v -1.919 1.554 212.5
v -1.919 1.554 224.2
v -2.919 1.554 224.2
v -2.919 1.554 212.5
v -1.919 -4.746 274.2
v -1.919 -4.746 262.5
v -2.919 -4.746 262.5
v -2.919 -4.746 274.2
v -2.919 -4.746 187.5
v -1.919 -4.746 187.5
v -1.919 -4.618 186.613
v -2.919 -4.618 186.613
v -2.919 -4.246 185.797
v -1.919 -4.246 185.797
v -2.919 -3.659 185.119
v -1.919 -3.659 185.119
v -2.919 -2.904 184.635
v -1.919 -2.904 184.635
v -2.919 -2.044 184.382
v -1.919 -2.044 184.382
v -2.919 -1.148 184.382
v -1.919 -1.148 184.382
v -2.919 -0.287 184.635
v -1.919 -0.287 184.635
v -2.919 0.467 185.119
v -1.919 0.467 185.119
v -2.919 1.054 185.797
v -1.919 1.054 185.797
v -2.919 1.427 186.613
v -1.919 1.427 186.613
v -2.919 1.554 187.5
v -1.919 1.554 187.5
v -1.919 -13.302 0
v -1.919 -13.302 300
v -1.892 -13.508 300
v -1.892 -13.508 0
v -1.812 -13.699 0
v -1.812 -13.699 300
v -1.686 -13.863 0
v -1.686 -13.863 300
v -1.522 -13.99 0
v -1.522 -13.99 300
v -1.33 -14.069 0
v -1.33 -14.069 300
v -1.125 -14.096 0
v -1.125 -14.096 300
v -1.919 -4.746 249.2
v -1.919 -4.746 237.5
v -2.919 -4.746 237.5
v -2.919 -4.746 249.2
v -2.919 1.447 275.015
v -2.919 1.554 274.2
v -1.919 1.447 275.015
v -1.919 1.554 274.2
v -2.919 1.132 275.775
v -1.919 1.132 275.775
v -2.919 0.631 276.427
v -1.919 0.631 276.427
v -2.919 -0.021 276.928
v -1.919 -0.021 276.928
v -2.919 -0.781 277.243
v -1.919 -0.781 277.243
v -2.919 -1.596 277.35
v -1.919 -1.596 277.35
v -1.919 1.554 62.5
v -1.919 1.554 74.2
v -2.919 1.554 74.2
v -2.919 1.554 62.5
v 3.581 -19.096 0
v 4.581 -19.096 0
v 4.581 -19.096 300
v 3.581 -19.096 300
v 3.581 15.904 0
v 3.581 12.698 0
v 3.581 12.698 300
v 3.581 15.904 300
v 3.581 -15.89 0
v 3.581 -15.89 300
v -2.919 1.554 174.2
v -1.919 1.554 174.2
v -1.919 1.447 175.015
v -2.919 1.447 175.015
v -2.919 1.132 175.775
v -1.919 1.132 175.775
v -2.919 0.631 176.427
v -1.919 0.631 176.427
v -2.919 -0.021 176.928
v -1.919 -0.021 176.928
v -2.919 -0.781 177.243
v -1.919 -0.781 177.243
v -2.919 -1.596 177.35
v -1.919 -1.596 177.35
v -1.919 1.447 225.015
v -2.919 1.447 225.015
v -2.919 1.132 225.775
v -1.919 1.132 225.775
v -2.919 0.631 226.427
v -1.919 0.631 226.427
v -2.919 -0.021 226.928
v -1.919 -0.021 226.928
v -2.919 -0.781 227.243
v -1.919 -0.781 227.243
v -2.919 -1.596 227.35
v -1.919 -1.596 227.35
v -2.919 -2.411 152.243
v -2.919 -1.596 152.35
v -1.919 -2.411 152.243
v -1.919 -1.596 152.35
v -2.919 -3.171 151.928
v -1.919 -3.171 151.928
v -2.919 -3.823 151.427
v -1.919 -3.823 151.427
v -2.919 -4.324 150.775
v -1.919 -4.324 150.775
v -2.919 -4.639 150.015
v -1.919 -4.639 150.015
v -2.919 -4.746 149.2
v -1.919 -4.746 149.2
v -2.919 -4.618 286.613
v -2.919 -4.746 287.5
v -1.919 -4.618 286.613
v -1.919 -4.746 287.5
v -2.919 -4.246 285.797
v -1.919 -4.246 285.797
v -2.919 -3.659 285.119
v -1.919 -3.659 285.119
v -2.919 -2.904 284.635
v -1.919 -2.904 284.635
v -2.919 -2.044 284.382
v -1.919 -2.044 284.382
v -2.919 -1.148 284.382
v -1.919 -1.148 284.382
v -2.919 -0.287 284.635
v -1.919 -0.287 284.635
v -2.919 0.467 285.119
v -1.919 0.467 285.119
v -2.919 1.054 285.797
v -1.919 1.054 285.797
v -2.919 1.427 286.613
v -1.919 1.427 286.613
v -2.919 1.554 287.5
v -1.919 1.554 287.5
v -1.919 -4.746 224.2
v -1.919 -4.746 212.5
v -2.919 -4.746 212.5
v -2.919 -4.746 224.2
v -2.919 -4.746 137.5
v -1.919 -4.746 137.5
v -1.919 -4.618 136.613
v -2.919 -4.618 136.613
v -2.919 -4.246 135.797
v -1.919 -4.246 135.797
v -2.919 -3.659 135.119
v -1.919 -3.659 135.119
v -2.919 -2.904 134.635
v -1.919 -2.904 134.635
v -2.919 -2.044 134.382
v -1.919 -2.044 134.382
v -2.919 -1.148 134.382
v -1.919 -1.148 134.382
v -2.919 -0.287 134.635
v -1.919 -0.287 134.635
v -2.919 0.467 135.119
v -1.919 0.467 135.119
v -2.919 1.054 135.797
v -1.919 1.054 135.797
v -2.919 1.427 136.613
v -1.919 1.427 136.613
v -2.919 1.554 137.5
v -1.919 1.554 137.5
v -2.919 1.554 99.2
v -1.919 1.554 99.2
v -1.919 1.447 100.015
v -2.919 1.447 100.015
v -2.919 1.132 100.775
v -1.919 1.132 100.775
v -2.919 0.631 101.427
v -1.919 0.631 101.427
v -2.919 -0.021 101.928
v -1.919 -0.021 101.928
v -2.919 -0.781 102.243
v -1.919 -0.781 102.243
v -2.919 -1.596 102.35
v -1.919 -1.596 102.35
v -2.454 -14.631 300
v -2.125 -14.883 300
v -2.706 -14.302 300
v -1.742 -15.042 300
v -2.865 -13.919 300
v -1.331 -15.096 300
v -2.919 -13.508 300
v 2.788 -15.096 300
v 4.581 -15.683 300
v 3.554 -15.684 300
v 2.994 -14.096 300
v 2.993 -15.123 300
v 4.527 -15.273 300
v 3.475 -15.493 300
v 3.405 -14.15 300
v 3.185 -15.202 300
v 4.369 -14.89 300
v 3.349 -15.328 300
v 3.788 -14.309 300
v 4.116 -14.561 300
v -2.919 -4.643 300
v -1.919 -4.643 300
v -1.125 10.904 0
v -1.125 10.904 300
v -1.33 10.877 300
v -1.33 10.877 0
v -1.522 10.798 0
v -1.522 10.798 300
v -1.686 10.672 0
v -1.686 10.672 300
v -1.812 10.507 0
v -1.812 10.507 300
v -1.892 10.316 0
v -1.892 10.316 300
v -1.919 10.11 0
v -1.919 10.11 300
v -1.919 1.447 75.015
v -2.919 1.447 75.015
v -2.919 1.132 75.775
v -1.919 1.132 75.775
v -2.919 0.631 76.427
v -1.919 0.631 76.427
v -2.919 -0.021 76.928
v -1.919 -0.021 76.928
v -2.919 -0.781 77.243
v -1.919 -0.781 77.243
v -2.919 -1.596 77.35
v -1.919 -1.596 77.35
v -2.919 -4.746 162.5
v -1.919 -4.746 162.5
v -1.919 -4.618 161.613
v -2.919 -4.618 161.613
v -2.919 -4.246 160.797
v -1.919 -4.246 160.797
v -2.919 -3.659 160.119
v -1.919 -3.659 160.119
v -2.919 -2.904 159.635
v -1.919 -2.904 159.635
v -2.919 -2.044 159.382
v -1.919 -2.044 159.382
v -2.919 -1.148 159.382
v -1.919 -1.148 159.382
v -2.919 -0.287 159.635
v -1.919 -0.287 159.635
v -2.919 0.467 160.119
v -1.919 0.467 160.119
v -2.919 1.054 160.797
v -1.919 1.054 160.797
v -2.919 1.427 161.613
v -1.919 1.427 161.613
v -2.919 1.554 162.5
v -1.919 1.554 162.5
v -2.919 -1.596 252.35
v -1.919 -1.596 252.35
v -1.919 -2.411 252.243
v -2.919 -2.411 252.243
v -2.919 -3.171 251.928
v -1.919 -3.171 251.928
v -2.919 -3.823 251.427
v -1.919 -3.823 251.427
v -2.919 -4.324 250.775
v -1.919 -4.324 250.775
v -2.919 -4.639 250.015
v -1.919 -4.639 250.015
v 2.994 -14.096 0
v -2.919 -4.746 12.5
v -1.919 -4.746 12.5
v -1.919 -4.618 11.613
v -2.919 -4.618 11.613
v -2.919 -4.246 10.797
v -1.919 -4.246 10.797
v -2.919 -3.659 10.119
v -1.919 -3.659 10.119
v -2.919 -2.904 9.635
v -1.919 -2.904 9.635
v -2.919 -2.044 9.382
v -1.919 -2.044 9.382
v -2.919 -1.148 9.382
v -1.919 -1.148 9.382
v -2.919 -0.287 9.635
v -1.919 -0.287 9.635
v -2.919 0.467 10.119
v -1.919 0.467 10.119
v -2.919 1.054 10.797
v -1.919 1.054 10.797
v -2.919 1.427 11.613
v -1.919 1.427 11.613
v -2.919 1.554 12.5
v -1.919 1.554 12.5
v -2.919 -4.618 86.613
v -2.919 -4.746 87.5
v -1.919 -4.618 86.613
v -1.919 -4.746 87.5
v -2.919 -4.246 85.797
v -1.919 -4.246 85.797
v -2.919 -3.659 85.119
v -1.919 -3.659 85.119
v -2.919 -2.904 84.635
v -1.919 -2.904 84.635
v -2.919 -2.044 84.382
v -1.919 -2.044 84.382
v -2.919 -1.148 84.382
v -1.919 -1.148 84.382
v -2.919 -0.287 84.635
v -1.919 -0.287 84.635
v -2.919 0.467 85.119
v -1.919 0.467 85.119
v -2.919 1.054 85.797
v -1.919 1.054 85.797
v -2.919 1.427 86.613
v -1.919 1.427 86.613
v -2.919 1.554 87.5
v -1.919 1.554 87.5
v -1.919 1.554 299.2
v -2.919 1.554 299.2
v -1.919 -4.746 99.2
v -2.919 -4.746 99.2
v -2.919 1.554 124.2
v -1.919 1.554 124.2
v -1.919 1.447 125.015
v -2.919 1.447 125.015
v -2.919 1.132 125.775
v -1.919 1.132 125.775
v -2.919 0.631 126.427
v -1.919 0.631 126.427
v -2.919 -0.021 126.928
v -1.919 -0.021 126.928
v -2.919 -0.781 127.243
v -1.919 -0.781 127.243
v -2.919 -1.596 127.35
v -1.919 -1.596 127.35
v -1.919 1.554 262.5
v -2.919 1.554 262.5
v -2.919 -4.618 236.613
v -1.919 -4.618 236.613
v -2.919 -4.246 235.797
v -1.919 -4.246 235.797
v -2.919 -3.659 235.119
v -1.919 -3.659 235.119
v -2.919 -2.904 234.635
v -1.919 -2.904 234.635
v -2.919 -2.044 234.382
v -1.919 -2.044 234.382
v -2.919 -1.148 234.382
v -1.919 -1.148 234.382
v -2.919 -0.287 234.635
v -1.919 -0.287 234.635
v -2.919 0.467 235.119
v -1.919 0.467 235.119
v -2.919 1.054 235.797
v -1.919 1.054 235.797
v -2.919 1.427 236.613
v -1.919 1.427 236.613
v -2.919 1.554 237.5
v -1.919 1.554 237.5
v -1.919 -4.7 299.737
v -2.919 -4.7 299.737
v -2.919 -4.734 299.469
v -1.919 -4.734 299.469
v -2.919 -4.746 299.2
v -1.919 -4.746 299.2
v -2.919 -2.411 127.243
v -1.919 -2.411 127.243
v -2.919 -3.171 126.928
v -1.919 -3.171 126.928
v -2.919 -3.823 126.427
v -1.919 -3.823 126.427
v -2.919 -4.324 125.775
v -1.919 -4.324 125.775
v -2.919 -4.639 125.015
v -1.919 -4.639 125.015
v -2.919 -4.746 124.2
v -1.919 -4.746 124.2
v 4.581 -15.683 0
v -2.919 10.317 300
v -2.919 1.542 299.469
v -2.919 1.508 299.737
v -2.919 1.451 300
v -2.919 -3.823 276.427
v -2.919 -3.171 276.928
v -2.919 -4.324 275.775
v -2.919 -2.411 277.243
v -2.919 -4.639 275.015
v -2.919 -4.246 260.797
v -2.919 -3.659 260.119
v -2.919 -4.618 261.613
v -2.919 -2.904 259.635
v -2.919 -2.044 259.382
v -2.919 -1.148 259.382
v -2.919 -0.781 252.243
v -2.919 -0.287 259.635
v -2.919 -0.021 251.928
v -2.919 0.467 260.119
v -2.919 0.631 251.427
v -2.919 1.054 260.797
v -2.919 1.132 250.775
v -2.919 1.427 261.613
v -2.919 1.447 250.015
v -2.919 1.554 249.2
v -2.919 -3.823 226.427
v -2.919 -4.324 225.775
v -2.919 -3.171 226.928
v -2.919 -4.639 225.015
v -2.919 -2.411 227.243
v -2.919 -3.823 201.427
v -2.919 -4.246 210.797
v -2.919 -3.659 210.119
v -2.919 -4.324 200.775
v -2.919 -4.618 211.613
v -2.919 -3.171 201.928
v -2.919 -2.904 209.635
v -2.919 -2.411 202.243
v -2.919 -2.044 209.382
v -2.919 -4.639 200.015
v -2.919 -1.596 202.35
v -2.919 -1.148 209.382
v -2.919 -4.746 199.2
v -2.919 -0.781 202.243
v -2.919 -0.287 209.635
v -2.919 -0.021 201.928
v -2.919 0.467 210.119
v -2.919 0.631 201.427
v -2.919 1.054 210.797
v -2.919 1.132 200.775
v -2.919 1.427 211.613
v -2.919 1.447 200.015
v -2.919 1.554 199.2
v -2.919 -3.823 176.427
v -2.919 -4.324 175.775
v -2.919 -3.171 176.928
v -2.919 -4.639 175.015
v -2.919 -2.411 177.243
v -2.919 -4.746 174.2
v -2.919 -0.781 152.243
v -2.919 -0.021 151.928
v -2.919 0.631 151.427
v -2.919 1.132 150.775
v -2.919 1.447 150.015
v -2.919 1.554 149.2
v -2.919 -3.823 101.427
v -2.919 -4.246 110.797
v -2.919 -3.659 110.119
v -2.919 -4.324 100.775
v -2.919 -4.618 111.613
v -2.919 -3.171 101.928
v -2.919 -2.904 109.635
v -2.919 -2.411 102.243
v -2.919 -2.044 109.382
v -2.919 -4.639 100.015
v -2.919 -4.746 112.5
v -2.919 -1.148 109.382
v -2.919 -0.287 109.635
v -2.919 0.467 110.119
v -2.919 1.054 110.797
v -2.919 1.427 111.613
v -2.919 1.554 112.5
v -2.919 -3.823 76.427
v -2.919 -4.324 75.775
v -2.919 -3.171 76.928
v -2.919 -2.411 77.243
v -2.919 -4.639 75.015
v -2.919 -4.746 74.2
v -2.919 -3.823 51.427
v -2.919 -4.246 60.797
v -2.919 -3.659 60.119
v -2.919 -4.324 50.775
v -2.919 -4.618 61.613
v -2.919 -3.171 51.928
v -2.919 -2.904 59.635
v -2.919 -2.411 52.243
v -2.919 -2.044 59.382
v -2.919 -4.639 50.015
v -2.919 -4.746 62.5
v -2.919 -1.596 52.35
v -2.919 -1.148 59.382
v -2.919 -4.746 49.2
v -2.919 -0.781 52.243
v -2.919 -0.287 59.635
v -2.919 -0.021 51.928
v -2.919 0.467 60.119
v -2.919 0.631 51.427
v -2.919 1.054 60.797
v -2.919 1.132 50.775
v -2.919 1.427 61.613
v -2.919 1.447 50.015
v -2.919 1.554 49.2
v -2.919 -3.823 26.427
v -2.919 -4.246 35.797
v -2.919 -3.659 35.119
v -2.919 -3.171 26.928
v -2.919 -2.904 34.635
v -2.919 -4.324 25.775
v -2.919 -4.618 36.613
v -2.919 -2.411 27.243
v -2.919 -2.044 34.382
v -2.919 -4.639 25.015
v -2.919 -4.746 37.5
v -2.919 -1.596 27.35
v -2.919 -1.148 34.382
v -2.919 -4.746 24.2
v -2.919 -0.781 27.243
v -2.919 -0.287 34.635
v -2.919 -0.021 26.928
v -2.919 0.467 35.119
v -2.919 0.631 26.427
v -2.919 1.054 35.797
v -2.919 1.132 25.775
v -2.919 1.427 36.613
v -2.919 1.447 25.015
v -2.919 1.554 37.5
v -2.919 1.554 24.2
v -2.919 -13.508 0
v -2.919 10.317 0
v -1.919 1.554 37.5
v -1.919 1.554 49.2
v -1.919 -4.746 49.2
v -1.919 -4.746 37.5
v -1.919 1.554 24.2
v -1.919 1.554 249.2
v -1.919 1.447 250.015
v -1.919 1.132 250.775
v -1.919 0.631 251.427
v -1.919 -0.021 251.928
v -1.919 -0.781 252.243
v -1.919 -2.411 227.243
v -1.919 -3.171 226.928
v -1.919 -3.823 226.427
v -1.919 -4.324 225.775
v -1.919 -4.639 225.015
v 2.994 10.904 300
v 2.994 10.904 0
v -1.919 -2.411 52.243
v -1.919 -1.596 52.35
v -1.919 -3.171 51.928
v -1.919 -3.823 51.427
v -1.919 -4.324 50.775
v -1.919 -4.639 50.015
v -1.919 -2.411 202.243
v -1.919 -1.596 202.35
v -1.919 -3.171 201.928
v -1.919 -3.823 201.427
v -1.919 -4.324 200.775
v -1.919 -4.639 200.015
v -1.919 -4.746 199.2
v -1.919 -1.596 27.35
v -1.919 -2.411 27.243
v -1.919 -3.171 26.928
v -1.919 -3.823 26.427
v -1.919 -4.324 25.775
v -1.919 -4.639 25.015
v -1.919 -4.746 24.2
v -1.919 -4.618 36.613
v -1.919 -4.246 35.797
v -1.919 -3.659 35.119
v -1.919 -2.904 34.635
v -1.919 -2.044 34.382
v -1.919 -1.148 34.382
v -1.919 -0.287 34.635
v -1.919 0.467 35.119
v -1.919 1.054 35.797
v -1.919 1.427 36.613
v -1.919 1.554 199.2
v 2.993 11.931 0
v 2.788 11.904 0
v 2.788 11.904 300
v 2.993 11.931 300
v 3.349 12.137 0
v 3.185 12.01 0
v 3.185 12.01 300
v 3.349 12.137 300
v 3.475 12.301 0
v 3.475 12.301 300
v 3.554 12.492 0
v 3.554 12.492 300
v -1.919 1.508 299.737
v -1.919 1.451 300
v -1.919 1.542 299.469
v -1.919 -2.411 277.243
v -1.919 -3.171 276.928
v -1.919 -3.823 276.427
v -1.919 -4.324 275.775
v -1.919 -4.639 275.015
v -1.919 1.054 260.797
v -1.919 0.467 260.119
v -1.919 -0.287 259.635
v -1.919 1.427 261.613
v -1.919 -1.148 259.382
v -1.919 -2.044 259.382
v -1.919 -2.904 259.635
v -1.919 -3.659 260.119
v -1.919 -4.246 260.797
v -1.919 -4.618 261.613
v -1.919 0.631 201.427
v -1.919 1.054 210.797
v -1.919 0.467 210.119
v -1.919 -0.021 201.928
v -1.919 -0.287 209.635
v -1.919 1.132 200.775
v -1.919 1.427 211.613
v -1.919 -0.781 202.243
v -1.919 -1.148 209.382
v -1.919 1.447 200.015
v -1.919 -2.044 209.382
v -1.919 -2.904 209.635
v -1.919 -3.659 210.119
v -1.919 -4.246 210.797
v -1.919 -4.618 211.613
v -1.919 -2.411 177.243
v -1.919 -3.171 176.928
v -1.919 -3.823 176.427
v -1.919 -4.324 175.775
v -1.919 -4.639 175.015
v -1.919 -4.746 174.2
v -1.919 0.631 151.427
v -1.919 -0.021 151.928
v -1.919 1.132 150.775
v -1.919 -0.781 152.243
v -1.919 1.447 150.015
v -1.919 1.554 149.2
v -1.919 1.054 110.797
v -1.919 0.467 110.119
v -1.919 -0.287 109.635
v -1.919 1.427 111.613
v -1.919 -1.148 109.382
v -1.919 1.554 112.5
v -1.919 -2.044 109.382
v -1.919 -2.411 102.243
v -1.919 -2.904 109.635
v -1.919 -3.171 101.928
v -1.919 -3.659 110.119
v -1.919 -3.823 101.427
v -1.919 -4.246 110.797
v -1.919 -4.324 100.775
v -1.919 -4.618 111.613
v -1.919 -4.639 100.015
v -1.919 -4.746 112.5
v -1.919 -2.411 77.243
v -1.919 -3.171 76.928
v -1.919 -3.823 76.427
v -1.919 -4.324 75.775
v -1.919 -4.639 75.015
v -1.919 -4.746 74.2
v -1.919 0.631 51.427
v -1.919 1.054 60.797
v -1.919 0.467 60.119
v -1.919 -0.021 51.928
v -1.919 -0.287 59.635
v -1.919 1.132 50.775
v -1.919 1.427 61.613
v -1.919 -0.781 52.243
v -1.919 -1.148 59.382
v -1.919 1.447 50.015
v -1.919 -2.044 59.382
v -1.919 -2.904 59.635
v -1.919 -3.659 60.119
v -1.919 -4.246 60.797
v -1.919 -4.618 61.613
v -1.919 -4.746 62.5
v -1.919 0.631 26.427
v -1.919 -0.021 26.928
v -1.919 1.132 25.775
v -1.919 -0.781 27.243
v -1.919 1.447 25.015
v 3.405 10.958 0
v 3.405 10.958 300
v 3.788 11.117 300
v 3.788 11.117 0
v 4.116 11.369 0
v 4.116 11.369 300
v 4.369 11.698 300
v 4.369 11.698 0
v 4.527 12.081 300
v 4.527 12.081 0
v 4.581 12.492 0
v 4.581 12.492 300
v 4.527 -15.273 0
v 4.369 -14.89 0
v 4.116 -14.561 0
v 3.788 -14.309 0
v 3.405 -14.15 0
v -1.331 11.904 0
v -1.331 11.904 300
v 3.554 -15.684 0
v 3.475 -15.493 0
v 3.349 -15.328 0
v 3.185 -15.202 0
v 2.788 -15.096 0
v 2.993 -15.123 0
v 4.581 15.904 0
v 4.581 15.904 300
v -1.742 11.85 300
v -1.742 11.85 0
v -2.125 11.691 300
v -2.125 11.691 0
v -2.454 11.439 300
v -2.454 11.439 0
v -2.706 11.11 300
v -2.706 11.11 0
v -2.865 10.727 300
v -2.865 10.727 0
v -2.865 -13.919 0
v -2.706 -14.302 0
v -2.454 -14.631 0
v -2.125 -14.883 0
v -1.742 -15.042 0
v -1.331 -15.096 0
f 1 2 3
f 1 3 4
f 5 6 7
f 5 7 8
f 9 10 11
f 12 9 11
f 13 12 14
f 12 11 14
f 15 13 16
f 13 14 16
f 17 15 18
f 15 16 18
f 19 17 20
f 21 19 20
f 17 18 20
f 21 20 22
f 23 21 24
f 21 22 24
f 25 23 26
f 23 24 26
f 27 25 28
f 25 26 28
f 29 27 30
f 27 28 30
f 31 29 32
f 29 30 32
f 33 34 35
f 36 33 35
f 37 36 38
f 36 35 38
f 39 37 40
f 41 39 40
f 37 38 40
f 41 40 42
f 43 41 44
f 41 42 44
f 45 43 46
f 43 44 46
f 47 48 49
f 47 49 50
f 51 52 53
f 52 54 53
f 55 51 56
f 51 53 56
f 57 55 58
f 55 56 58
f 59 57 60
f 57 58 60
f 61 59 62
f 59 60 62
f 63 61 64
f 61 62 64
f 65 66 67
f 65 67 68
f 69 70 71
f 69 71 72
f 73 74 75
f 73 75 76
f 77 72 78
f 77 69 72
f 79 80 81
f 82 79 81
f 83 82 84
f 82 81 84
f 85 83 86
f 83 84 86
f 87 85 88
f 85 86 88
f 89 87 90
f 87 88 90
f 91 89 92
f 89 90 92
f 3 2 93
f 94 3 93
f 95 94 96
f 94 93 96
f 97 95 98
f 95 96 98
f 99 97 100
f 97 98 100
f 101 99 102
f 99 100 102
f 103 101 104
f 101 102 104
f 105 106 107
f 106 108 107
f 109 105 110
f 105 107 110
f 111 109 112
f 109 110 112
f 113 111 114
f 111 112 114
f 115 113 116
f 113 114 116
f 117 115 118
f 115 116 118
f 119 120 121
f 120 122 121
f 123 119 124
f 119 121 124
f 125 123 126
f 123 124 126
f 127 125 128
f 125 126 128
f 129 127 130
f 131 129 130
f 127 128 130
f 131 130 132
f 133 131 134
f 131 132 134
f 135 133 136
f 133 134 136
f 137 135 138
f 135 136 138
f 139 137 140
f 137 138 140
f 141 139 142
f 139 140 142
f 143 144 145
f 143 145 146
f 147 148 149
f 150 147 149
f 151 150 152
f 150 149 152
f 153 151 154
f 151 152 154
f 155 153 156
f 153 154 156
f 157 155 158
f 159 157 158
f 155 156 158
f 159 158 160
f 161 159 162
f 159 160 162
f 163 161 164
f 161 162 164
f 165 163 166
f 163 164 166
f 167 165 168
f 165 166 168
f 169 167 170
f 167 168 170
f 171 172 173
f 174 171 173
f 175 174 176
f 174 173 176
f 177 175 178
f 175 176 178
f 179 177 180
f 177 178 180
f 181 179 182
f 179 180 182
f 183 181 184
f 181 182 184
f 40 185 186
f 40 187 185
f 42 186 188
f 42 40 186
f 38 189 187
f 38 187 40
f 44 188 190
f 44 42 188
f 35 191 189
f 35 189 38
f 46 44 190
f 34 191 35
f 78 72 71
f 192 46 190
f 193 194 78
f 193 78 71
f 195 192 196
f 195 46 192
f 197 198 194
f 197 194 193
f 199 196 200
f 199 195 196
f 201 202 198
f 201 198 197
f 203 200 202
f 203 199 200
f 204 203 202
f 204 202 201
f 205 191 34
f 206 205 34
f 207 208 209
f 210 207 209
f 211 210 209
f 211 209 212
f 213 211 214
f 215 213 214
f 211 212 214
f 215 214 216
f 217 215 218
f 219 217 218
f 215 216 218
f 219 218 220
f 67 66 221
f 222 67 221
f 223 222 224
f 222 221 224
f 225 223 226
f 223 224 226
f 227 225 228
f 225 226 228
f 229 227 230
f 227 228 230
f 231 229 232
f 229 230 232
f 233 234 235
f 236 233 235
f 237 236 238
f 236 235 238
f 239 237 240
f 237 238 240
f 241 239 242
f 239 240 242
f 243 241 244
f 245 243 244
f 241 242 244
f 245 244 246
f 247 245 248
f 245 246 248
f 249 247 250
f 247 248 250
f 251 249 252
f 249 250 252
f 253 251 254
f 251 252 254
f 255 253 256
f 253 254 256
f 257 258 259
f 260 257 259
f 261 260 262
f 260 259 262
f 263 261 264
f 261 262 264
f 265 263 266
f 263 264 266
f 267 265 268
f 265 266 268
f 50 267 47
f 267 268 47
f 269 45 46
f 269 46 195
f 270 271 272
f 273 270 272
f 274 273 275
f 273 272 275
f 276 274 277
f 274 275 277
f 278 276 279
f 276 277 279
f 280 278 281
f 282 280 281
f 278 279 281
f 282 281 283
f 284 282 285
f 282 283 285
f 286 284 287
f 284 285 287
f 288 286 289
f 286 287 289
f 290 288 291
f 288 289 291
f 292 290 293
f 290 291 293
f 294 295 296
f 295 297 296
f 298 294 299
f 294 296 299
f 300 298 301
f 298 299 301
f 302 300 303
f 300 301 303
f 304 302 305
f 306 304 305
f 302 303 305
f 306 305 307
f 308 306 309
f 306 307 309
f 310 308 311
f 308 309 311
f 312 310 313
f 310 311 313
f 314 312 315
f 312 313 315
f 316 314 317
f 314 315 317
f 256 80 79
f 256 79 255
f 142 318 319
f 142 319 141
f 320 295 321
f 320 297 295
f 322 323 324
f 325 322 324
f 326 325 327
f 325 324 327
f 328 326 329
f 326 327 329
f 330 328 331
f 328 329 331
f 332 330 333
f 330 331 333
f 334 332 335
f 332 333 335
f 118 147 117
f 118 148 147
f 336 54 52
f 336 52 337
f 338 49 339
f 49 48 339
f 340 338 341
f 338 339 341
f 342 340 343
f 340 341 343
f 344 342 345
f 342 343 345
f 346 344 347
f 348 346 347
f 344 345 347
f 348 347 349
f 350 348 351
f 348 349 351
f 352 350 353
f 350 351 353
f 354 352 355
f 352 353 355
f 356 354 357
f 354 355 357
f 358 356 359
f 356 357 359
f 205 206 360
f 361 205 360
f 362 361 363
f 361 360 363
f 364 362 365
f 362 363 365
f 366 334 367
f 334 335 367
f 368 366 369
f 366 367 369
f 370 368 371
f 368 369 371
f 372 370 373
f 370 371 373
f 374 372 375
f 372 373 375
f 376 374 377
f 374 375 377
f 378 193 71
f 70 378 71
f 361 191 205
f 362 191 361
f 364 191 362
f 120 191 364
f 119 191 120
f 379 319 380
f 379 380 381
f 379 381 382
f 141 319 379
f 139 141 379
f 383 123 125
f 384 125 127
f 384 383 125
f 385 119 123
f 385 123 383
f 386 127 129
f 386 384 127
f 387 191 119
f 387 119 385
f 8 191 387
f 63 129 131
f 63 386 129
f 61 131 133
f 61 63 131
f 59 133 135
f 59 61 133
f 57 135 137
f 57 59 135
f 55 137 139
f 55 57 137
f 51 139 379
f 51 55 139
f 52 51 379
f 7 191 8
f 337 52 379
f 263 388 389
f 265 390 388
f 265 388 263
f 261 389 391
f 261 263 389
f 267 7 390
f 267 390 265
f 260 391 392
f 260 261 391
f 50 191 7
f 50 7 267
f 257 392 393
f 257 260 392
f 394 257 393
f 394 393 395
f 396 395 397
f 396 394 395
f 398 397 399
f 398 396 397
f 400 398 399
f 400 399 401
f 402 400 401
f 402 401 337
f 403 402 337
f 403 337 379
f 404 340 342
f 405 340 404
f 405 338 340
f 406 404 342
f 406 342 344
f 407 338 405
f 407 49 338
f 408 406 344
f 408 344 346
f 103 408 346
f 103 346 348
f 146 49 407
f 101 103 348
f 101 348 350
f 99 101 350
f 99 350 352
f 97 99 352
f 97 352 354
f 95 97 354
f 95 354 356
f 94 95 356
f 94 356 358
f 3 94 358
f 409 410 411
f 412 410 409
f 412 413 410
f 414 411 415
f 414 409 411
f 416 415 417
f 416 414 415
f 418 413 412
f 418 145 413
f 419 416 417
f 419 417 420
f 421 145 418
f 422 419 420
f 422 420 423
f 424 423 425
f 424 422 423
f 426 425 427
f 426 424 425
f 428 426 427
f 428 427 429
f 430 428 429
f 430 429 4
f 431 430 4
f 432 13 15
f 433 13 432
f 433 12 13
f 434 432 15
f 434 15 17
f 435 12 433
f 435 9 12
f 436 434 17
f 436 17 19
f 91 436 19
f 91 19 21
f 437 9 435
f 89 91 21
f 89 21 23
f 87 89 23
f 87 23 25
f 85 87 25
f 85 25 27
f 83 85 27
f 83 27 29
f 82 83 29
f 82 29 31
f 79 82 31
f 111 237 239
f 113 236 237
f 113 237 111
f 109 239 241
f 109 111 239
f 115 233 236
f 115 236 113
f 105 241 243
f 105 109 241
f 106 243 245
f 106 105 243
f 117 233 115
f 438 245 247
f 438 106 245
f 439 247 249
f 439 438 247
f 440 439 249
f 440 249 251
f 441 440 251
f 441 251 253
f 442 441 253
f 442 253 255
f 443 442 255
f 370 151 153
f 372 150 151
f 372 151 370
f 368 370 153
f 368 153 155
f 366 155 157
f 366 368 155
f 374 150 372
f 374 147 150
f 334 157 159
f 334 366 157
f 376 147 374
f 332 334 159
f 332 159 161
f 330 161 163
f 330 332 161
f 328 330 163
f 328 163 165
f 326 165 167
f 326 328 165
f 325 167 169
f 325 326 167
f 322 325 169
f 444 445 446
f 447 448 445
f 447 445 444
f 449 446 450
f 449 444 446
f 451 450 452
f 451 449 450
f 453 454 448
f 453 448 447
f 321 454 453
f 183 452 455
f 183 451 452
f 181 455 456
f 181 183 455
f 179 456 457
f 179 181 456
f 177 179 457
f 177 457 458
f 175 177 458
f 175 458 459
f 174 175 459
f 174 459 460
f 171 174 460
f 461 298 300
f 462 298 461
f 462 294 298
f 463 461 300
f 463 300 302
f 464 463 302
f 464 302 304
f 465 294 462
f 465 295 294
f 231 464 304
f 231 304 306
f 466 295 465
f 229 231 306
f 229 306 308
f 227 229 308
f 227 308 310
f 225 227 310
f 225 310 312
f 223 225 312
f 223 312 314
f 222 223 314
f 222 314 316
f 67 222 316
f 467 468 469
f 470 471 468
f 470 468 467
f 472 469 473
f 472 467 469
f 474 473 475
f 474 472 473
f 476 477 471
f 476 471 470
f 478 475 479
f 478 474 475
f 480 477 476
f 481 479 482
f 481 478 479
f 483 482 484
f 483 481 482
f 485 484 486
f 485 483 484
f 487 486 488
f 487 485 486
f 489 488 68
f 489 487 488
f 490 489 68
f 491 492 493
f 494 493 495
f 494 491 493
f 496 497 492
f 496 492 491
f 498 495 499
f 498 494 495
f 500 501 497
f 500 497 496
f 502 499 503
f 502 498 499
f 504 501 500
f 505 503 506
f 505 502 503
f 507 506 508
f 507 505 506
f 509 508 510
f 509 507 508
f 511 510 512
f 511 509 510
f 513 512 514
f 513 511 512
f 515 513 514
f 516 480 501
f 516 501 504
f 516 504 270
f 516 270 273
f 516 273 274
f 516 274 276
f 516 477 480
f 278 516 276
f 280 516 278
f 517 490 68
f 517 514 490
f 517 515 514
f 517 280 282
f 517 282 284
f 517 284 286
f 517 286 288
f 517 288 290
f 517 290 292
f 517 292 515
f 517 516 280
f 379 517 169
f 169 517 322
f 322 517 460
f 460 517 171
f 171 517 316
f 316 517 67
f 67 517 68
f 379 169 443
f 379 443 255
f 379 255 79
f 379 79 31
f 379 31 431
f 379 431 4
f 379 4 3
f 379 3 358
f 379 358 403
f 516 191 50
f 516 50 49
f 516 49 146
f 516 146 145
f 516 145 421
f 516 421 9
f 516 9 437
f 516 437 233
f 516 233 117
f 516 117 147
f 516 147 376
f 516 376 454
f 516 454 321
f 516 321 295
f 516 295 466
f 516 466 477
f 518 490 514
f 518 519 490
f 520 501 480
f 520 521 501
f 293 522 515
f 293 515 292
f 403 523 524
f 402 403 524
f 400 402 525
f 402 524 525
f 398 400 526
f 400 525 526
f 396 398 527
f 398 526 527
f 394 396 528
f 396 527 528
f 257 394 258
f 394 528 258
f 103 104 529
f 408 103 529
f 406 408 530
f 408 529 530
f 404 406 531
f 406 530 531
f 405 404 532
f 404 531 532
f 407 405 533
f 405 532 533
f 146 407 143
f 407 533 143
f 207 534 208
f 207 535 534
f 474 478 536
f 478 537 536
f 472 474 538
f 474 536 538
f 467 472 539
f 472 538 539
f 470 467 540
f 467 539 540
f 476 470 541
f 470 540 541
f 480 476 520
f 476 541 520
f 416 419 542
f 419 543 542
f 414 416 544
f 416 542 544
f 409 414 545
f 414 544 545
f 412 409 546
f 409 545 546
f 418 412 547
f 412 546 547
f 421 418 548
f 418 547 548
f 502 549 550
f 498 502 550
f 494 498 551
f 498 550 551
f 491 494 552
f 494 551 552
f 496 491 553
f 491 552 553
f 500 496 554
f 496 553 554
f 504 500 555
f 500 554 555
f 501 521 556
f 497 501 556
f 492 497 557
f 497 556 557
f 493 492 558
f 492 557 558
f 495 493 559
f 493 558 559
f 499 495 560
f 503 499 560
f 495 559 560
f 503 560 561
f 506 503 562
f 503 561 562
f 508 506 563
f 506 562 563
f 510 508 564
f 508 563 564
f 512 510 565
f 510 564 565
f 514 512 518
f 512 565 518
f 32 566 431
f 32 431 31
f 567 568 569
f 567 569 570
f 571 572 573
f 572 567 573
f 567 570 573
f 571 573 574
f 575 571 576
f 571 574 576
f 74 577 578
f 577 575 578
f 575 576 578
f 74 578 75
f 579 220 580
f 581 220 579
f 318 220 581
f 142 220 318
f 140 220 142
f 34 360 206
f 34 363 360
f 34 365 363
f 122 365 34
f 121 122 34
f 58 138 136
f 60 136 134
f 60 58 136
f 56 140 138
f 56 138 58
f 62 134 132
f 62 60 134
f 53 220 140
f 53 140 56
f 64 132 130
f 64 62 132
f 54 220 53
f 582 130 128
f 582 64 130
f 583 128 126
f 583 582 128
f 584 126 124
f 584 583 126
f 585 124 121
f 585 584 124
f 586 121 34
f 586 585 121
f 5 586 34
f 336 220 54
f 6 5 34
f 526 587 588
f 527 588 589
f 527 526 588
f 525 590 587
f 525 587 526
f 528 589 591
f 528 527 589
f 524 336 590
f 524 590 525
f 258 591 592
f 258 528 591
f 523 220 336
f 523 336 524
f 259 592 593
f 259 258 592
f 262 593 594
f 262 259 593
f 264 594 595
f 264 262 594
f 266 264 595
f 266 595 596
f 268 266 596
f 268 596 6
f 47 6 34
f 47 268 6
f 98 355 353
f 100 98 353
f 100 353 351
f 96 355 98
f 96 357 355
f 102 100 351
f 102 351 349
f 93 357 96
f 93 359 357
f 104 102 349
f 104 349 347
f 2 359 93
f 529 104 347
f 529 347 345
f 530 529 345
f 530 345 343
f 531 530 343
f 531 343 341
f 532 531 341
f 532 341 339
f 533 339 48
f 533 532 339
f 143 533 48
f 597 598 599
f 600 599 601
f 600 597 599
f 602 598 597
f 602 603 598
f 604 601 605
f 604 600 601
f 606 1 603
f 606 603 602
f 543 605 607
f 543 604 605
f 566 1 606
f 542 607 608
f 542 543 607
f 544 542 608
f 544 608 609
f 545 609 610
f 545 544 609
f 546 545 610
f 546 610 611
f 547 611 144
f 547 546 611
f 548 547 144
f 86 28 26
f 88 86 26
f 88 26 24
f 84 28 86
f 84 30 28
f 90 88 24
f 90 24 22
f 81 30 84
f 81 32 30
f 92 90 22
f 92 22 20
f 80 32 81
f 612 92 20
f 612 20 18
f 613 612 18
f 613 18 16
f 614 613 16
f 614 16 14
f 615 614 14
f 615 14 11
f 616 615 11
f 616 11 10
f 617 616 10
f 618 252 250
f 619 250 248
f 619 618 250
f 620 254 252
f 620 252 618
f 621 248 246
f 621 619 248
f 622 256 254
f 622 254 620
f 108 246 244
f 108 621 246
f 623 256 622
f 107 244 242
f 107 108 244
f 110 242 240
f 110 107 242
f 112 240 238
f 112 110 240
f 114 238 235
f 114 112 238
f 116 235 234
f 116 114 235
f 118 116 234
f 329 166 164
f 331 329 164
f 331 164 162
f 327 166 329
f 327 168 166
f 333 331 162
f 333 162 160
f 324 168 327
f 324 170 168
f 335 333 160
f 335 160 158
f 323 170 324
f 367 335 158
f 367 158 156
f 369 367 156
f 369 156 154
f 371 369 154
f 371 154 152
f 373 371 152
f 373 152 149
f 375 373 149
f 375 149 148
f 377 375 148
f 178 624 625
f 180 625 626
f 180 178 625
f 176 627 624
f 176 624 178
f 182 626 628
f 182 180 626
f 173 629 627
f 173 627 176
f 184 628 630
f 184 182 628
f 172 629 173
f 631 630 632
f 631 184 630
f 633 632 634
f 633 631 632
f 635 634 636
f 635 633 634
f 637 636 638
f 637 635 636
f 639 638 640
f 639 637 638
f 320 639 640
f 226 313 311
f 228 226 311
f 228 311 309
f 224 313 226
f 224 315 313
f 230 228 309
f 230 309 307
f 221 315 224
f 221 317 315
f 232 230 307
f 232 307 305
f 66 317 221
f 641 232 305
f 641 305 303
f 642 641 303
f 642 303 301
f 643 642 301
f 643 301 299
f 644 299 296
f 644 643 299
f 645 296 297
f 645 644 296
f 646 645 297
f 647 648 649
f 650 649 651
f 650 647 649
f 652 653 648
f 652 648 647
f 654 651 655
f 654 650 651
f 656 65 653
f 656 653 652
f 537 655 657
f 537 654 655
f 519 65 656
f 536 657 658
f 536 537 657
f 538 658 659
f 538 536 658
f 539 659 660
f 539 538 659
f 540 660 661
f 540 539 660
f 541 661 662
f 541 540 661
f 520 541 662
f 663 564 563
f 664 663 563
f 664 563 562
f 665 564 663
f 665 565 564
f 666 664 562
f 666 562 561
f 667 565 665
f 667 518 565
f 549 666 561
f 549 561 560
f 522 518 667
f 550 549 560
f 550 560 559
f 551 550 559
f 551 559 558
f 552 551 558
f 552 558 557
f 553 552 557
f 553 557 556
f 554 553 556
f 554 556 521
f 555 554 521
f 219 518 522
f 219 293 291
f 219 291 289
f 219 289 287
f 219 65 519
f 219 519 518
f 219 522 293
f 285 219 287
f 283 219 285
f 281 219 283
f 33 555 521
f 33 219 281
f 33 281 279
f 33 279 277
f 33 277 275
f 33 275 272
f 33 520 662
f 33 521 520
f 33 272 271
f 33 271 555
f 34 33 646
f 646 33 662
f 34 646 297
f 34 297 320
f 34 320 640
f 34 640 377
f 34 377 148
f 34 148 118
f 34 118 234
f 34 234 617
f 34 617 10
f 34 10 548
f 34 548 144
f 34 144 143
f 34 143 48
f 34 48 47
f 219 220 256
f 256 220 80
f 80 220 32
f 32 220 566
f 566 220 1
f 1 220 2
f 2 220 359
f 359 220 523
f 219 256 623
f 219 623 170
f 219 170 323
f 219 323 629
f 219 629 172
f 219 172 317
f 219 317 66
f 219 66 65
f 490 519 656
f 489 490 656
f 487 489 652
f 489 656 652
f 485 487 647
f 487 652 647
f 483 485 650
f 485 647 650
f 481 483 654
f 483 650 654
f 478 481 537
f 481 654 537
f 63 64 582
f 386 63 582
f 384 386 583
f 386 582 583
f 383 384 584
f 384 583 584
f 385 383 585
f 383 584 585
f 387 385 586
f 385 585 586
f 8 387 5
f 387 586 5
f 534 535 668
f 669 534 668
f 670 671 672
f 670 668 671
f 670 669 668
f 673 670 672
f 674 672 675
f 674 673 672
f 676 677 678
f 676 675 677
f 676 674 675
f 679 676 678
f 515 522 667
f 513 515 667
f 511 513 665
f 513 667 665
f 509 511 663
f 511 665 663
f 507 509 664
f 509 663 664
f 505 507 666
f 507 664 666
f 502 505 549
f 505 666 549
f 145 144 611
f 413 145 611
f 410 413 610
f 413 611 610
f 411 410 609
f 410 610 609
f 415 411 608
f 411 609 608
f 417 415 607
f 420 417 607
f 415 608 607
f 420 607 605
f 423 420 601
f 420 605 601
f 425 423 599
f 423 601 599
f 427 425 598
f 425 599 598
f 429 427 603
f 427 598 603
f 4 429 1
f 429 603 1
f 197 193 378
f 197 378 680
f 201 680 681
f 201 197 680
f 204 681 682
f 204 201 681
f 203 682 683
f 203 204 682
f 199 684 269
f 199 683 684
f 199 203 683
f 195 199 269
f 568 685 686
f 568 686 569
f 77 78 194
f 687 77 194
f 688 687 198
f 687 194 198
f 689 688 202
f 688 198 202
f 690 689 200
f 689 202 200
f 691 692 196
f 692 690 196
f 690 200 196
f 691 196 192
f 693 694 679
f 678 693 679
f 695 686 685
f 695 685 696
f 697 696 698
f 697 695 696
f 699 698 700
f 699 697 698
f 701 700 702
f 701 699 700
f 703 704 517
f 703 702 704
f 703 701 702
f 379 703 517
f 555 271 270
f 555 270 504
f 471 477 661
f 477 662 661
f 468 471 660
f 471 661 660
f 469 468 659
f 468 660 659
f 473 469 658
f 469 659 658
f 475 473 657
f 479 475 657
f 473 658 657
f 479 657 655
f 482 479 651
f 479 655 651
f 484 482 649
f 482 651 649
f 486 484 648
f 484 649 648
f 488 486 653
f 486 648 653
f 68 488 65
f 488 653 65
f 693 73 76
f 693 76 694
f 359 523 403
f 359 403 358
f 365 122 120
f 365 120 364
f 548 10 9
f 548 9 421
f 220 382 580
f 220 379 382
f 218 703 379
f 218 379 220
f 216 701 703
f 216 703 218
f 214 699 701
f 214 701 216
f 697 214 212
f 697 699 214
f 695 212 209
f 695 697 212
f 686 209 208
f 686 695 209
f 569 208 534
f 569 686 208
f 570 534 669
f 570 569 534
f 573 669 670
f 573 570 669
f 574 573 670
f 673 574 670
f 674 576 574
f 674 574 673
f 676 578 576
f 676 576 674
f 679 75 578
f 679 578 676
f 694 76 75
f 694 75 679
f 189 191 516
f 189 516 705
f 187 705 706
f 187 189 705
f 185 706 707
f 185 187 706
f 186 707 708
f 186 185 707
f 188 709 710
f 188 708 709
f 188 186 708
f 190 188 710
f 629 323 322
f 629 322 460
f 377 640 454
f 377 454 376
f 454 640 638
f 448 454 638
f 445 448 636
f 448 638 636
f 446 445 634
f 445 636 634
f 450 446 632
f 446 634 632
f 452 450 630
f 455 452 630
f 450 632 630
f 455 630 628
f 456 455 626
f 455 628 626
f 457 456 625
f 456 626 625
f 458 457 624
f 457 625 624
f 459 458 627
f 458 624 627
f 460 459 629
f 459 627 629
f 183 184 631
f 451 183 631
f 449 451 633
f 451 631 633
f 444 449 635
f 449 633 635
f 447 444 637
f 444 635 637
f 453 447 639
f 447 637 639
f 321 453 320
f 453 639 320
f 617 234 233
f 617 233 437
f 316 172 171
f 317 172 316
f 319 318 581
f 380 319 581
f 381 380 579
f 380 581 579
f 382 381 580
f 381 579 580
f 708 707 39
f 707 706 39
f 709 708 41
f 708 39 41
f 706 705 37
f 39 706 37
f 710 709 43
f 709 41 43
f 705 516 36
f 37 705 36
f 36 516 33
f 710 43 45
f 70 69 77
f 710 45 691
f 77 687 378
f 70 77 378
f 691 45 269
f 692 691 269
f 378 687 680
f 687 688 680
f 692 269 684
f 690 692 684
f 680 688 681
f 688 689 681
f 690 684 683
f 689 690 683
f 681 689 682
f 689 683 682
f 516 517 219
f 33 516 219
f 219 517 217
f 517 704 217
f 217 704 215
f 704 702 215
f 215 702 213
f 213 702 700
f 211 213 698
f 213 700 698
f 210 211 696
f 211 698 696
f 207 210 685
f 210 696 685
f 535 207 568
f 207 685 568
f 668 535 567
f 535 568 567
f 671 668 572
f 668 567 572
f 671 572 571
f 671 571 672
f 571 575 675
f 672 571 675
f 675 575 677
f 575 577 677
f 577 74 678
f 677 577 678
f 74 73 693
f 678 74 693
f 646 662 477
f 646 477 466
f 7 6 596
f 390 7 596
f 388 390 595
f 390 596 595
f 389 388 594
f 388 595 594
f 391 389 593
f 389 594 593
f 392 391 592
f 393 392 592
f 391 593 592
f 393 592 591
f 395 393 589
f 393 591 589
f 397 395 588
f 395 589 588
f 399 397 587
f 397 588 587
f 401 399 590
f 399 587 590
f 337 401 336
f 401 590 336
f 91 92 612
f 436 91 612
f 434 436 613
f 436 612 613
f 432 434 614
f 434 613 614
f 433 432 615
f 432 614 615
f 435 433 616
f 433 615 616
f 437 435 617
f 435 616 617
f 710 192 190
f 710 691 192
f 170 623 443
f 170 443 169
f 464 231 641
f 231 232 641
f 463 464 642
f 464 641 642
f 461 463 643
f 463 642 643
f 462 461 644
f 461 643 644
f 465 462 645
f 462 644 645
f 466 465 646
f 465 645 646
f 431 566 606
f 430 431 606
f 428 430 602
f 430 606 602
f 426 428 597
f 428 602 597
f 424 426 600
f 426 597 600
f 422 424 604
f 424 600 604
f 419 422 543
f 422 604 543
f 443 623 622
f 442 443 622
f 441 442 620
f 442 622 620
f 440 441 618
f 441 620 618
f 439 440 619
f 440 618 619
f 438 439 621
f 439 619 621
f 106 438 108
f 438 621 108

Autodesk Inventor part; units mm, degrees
ref_plane "YZ Plane" through (0, 0, 0) normal (1, 0, 0) x (0, 1, 0)
ref_plane "XZ Plane" through (0, 0, 0) normal (0, 1, 0) x (-1, 0, 0)
ref_plane "XY Plane" through (0, 0, 0) normal (0, 0, 1) x (1, 0, 0)
sketch "Sketch2" plane through (0, 0, 0) normal (0, 0, 1) x (1, 0, 0)
  line L0 (3.5814, 15.9041) -> (4.5814, 15.9041)
  line L1 (4.5814, 15.9041) -> (4.5814, 10.9041)
  line L2 (4.5814, 10.9041) -> (-1.9186, 10.9041)
  line L3 (-1.9186, 10.9041) -> (-1.9186, -14.0959)
  line L4 (-1.9186, -14.0959) -> (4.5814, -14.0959)
  line L5 (4.5814, -14.0959) -> (4.5814, -19.0959)
  line L6 (4.5814, -19.0959) -> (3.5814, -19.0959)
  line L7 (3.5814, -19.0959) -> (3.5814, -15.0959)
  line L8 (3.5814, -15.0959) -> (-2.9186, -15.0959)
  line L9 (-2.9186, -15.0959) -> (-2.9186, 11.9041)
  line L10 (-2.9186, 11.9041) -> (3.5814, 11.9041)
  line L11 (3.5814, 11.9041) -> (3.5814, 15.9041)
  dimension "d0" = 1
  dimension "d1" = 35
  dimension "d2" = 27
  dimension "d3" = 1
  dimension "d4" = 1
  dimension "d5" = 1
  dimension "d6" = 1
  dimension "d7" = 4
  dimension "d8" = 7.5
extrude "Main" add sketch "Sketch2" along normal blind 300
fillet "Fillet2" radius 1.5875 4 edges at (4.5814, 10.9041, 150) (-2.9186, 11.9041, 150) (4.5814, -14.0959, 150) (-2.9186, -15.0959, 150)
fillet "Fillet3" radius 0.7937 4 edges at (3.5814, -15.0959, 150) (-1.9186, 10.9041, 150) (3.5814, 11.9041, 150) (-1.9186, -14.0959, 150)
sketch "Sketch3" plane through (-1.9186, -13.3022, 0) normal (1, 0, 0) x (0, 0, -1)
  line L0 (0, 23.4125) -> (0, 0) projected
  line L1 (-12.5, 8.5563) -> (-24.2, 8.5563)
  line L2 (-27.35, 11.7063) -> (-27.35, 11.7062)
  line L3 (-24.2, 14.8562) -> (-12.5, 14.8563)
  line L4 (-9.35, 11.7063) -> (-9.35, 11.7063)
  arc A0 (-24.2, 14.8562) -> (-27.35, 11.7062) centre (-24.2, 11.7062) ccw
  arc A1 (-27.35, 11.7063) -> (-24.2, 8.5563) centre (-24.2, 11.7063) ccw
  arc A2 (-12.5, 8.5563) -> (-9.35, 11.7063) centre (-12.5, 11.7063) ccw
  arc A3 (-9.35, 11.7063) -> (-12.5, 14.8563) centre (-12.5, 11.7063) ccw
  line L5 (0, 29.2063) -> (-300, 29.2063) projected
  dimension "d14" = 3.15
  dimension "d15" = 6.3
  dimension "d16" = 18
  dimension "d17" = 17.5
  dimension "d18" = 12.5
extrude "Extrusion2" cut sketch "Sketch3" against normal through all
pattern_linear "Rectangular Pattern1" count 30 spacing 25 along (0, 0, 1) of "Extrusion2"
equation "\"d0\" = DINWidth"
equation "\"d1\" = DINHeight"
equation "\"d2\" = DINHeightBack"
equation "\"d3\" = DINWidth"
equation "\"d4\" = DINWidth"
equation "\"d5\" = DINWidth"
equation "\"d6\" = DINWidth"
equation "\"d7\" = -0.5 * d2 + 0.5 * d1"
equation "\"d8\" = DINDepth"
equation "\"d14\" = 0.5 * SlotHeight"
equation "\"d15\" = SlotHeight"
equation "\"d16\" = SlotLength"
equation "\"d17\" = 0.5 * DINHeight"
equation "\"d18\" = 0.5 * SlotSpacing"
equation "\"d23\" = SlotSpacing"
equation "\"DINLength\" = 76.2"
equation "\"DINHeight\" = 35"
equation "\"DINHeightBack\" = 27"
equation "\"DINDepth\" = 7.5"
equation "\"SlotHeight\" = 6.3"
equation "\"SlotLength\" = 18"
equation "\"SlotSpacing\" = 25"
equation "\"DINWidth\" = 1"
properties part number "Din Rail_300" material "Латунь светло-желтая"
